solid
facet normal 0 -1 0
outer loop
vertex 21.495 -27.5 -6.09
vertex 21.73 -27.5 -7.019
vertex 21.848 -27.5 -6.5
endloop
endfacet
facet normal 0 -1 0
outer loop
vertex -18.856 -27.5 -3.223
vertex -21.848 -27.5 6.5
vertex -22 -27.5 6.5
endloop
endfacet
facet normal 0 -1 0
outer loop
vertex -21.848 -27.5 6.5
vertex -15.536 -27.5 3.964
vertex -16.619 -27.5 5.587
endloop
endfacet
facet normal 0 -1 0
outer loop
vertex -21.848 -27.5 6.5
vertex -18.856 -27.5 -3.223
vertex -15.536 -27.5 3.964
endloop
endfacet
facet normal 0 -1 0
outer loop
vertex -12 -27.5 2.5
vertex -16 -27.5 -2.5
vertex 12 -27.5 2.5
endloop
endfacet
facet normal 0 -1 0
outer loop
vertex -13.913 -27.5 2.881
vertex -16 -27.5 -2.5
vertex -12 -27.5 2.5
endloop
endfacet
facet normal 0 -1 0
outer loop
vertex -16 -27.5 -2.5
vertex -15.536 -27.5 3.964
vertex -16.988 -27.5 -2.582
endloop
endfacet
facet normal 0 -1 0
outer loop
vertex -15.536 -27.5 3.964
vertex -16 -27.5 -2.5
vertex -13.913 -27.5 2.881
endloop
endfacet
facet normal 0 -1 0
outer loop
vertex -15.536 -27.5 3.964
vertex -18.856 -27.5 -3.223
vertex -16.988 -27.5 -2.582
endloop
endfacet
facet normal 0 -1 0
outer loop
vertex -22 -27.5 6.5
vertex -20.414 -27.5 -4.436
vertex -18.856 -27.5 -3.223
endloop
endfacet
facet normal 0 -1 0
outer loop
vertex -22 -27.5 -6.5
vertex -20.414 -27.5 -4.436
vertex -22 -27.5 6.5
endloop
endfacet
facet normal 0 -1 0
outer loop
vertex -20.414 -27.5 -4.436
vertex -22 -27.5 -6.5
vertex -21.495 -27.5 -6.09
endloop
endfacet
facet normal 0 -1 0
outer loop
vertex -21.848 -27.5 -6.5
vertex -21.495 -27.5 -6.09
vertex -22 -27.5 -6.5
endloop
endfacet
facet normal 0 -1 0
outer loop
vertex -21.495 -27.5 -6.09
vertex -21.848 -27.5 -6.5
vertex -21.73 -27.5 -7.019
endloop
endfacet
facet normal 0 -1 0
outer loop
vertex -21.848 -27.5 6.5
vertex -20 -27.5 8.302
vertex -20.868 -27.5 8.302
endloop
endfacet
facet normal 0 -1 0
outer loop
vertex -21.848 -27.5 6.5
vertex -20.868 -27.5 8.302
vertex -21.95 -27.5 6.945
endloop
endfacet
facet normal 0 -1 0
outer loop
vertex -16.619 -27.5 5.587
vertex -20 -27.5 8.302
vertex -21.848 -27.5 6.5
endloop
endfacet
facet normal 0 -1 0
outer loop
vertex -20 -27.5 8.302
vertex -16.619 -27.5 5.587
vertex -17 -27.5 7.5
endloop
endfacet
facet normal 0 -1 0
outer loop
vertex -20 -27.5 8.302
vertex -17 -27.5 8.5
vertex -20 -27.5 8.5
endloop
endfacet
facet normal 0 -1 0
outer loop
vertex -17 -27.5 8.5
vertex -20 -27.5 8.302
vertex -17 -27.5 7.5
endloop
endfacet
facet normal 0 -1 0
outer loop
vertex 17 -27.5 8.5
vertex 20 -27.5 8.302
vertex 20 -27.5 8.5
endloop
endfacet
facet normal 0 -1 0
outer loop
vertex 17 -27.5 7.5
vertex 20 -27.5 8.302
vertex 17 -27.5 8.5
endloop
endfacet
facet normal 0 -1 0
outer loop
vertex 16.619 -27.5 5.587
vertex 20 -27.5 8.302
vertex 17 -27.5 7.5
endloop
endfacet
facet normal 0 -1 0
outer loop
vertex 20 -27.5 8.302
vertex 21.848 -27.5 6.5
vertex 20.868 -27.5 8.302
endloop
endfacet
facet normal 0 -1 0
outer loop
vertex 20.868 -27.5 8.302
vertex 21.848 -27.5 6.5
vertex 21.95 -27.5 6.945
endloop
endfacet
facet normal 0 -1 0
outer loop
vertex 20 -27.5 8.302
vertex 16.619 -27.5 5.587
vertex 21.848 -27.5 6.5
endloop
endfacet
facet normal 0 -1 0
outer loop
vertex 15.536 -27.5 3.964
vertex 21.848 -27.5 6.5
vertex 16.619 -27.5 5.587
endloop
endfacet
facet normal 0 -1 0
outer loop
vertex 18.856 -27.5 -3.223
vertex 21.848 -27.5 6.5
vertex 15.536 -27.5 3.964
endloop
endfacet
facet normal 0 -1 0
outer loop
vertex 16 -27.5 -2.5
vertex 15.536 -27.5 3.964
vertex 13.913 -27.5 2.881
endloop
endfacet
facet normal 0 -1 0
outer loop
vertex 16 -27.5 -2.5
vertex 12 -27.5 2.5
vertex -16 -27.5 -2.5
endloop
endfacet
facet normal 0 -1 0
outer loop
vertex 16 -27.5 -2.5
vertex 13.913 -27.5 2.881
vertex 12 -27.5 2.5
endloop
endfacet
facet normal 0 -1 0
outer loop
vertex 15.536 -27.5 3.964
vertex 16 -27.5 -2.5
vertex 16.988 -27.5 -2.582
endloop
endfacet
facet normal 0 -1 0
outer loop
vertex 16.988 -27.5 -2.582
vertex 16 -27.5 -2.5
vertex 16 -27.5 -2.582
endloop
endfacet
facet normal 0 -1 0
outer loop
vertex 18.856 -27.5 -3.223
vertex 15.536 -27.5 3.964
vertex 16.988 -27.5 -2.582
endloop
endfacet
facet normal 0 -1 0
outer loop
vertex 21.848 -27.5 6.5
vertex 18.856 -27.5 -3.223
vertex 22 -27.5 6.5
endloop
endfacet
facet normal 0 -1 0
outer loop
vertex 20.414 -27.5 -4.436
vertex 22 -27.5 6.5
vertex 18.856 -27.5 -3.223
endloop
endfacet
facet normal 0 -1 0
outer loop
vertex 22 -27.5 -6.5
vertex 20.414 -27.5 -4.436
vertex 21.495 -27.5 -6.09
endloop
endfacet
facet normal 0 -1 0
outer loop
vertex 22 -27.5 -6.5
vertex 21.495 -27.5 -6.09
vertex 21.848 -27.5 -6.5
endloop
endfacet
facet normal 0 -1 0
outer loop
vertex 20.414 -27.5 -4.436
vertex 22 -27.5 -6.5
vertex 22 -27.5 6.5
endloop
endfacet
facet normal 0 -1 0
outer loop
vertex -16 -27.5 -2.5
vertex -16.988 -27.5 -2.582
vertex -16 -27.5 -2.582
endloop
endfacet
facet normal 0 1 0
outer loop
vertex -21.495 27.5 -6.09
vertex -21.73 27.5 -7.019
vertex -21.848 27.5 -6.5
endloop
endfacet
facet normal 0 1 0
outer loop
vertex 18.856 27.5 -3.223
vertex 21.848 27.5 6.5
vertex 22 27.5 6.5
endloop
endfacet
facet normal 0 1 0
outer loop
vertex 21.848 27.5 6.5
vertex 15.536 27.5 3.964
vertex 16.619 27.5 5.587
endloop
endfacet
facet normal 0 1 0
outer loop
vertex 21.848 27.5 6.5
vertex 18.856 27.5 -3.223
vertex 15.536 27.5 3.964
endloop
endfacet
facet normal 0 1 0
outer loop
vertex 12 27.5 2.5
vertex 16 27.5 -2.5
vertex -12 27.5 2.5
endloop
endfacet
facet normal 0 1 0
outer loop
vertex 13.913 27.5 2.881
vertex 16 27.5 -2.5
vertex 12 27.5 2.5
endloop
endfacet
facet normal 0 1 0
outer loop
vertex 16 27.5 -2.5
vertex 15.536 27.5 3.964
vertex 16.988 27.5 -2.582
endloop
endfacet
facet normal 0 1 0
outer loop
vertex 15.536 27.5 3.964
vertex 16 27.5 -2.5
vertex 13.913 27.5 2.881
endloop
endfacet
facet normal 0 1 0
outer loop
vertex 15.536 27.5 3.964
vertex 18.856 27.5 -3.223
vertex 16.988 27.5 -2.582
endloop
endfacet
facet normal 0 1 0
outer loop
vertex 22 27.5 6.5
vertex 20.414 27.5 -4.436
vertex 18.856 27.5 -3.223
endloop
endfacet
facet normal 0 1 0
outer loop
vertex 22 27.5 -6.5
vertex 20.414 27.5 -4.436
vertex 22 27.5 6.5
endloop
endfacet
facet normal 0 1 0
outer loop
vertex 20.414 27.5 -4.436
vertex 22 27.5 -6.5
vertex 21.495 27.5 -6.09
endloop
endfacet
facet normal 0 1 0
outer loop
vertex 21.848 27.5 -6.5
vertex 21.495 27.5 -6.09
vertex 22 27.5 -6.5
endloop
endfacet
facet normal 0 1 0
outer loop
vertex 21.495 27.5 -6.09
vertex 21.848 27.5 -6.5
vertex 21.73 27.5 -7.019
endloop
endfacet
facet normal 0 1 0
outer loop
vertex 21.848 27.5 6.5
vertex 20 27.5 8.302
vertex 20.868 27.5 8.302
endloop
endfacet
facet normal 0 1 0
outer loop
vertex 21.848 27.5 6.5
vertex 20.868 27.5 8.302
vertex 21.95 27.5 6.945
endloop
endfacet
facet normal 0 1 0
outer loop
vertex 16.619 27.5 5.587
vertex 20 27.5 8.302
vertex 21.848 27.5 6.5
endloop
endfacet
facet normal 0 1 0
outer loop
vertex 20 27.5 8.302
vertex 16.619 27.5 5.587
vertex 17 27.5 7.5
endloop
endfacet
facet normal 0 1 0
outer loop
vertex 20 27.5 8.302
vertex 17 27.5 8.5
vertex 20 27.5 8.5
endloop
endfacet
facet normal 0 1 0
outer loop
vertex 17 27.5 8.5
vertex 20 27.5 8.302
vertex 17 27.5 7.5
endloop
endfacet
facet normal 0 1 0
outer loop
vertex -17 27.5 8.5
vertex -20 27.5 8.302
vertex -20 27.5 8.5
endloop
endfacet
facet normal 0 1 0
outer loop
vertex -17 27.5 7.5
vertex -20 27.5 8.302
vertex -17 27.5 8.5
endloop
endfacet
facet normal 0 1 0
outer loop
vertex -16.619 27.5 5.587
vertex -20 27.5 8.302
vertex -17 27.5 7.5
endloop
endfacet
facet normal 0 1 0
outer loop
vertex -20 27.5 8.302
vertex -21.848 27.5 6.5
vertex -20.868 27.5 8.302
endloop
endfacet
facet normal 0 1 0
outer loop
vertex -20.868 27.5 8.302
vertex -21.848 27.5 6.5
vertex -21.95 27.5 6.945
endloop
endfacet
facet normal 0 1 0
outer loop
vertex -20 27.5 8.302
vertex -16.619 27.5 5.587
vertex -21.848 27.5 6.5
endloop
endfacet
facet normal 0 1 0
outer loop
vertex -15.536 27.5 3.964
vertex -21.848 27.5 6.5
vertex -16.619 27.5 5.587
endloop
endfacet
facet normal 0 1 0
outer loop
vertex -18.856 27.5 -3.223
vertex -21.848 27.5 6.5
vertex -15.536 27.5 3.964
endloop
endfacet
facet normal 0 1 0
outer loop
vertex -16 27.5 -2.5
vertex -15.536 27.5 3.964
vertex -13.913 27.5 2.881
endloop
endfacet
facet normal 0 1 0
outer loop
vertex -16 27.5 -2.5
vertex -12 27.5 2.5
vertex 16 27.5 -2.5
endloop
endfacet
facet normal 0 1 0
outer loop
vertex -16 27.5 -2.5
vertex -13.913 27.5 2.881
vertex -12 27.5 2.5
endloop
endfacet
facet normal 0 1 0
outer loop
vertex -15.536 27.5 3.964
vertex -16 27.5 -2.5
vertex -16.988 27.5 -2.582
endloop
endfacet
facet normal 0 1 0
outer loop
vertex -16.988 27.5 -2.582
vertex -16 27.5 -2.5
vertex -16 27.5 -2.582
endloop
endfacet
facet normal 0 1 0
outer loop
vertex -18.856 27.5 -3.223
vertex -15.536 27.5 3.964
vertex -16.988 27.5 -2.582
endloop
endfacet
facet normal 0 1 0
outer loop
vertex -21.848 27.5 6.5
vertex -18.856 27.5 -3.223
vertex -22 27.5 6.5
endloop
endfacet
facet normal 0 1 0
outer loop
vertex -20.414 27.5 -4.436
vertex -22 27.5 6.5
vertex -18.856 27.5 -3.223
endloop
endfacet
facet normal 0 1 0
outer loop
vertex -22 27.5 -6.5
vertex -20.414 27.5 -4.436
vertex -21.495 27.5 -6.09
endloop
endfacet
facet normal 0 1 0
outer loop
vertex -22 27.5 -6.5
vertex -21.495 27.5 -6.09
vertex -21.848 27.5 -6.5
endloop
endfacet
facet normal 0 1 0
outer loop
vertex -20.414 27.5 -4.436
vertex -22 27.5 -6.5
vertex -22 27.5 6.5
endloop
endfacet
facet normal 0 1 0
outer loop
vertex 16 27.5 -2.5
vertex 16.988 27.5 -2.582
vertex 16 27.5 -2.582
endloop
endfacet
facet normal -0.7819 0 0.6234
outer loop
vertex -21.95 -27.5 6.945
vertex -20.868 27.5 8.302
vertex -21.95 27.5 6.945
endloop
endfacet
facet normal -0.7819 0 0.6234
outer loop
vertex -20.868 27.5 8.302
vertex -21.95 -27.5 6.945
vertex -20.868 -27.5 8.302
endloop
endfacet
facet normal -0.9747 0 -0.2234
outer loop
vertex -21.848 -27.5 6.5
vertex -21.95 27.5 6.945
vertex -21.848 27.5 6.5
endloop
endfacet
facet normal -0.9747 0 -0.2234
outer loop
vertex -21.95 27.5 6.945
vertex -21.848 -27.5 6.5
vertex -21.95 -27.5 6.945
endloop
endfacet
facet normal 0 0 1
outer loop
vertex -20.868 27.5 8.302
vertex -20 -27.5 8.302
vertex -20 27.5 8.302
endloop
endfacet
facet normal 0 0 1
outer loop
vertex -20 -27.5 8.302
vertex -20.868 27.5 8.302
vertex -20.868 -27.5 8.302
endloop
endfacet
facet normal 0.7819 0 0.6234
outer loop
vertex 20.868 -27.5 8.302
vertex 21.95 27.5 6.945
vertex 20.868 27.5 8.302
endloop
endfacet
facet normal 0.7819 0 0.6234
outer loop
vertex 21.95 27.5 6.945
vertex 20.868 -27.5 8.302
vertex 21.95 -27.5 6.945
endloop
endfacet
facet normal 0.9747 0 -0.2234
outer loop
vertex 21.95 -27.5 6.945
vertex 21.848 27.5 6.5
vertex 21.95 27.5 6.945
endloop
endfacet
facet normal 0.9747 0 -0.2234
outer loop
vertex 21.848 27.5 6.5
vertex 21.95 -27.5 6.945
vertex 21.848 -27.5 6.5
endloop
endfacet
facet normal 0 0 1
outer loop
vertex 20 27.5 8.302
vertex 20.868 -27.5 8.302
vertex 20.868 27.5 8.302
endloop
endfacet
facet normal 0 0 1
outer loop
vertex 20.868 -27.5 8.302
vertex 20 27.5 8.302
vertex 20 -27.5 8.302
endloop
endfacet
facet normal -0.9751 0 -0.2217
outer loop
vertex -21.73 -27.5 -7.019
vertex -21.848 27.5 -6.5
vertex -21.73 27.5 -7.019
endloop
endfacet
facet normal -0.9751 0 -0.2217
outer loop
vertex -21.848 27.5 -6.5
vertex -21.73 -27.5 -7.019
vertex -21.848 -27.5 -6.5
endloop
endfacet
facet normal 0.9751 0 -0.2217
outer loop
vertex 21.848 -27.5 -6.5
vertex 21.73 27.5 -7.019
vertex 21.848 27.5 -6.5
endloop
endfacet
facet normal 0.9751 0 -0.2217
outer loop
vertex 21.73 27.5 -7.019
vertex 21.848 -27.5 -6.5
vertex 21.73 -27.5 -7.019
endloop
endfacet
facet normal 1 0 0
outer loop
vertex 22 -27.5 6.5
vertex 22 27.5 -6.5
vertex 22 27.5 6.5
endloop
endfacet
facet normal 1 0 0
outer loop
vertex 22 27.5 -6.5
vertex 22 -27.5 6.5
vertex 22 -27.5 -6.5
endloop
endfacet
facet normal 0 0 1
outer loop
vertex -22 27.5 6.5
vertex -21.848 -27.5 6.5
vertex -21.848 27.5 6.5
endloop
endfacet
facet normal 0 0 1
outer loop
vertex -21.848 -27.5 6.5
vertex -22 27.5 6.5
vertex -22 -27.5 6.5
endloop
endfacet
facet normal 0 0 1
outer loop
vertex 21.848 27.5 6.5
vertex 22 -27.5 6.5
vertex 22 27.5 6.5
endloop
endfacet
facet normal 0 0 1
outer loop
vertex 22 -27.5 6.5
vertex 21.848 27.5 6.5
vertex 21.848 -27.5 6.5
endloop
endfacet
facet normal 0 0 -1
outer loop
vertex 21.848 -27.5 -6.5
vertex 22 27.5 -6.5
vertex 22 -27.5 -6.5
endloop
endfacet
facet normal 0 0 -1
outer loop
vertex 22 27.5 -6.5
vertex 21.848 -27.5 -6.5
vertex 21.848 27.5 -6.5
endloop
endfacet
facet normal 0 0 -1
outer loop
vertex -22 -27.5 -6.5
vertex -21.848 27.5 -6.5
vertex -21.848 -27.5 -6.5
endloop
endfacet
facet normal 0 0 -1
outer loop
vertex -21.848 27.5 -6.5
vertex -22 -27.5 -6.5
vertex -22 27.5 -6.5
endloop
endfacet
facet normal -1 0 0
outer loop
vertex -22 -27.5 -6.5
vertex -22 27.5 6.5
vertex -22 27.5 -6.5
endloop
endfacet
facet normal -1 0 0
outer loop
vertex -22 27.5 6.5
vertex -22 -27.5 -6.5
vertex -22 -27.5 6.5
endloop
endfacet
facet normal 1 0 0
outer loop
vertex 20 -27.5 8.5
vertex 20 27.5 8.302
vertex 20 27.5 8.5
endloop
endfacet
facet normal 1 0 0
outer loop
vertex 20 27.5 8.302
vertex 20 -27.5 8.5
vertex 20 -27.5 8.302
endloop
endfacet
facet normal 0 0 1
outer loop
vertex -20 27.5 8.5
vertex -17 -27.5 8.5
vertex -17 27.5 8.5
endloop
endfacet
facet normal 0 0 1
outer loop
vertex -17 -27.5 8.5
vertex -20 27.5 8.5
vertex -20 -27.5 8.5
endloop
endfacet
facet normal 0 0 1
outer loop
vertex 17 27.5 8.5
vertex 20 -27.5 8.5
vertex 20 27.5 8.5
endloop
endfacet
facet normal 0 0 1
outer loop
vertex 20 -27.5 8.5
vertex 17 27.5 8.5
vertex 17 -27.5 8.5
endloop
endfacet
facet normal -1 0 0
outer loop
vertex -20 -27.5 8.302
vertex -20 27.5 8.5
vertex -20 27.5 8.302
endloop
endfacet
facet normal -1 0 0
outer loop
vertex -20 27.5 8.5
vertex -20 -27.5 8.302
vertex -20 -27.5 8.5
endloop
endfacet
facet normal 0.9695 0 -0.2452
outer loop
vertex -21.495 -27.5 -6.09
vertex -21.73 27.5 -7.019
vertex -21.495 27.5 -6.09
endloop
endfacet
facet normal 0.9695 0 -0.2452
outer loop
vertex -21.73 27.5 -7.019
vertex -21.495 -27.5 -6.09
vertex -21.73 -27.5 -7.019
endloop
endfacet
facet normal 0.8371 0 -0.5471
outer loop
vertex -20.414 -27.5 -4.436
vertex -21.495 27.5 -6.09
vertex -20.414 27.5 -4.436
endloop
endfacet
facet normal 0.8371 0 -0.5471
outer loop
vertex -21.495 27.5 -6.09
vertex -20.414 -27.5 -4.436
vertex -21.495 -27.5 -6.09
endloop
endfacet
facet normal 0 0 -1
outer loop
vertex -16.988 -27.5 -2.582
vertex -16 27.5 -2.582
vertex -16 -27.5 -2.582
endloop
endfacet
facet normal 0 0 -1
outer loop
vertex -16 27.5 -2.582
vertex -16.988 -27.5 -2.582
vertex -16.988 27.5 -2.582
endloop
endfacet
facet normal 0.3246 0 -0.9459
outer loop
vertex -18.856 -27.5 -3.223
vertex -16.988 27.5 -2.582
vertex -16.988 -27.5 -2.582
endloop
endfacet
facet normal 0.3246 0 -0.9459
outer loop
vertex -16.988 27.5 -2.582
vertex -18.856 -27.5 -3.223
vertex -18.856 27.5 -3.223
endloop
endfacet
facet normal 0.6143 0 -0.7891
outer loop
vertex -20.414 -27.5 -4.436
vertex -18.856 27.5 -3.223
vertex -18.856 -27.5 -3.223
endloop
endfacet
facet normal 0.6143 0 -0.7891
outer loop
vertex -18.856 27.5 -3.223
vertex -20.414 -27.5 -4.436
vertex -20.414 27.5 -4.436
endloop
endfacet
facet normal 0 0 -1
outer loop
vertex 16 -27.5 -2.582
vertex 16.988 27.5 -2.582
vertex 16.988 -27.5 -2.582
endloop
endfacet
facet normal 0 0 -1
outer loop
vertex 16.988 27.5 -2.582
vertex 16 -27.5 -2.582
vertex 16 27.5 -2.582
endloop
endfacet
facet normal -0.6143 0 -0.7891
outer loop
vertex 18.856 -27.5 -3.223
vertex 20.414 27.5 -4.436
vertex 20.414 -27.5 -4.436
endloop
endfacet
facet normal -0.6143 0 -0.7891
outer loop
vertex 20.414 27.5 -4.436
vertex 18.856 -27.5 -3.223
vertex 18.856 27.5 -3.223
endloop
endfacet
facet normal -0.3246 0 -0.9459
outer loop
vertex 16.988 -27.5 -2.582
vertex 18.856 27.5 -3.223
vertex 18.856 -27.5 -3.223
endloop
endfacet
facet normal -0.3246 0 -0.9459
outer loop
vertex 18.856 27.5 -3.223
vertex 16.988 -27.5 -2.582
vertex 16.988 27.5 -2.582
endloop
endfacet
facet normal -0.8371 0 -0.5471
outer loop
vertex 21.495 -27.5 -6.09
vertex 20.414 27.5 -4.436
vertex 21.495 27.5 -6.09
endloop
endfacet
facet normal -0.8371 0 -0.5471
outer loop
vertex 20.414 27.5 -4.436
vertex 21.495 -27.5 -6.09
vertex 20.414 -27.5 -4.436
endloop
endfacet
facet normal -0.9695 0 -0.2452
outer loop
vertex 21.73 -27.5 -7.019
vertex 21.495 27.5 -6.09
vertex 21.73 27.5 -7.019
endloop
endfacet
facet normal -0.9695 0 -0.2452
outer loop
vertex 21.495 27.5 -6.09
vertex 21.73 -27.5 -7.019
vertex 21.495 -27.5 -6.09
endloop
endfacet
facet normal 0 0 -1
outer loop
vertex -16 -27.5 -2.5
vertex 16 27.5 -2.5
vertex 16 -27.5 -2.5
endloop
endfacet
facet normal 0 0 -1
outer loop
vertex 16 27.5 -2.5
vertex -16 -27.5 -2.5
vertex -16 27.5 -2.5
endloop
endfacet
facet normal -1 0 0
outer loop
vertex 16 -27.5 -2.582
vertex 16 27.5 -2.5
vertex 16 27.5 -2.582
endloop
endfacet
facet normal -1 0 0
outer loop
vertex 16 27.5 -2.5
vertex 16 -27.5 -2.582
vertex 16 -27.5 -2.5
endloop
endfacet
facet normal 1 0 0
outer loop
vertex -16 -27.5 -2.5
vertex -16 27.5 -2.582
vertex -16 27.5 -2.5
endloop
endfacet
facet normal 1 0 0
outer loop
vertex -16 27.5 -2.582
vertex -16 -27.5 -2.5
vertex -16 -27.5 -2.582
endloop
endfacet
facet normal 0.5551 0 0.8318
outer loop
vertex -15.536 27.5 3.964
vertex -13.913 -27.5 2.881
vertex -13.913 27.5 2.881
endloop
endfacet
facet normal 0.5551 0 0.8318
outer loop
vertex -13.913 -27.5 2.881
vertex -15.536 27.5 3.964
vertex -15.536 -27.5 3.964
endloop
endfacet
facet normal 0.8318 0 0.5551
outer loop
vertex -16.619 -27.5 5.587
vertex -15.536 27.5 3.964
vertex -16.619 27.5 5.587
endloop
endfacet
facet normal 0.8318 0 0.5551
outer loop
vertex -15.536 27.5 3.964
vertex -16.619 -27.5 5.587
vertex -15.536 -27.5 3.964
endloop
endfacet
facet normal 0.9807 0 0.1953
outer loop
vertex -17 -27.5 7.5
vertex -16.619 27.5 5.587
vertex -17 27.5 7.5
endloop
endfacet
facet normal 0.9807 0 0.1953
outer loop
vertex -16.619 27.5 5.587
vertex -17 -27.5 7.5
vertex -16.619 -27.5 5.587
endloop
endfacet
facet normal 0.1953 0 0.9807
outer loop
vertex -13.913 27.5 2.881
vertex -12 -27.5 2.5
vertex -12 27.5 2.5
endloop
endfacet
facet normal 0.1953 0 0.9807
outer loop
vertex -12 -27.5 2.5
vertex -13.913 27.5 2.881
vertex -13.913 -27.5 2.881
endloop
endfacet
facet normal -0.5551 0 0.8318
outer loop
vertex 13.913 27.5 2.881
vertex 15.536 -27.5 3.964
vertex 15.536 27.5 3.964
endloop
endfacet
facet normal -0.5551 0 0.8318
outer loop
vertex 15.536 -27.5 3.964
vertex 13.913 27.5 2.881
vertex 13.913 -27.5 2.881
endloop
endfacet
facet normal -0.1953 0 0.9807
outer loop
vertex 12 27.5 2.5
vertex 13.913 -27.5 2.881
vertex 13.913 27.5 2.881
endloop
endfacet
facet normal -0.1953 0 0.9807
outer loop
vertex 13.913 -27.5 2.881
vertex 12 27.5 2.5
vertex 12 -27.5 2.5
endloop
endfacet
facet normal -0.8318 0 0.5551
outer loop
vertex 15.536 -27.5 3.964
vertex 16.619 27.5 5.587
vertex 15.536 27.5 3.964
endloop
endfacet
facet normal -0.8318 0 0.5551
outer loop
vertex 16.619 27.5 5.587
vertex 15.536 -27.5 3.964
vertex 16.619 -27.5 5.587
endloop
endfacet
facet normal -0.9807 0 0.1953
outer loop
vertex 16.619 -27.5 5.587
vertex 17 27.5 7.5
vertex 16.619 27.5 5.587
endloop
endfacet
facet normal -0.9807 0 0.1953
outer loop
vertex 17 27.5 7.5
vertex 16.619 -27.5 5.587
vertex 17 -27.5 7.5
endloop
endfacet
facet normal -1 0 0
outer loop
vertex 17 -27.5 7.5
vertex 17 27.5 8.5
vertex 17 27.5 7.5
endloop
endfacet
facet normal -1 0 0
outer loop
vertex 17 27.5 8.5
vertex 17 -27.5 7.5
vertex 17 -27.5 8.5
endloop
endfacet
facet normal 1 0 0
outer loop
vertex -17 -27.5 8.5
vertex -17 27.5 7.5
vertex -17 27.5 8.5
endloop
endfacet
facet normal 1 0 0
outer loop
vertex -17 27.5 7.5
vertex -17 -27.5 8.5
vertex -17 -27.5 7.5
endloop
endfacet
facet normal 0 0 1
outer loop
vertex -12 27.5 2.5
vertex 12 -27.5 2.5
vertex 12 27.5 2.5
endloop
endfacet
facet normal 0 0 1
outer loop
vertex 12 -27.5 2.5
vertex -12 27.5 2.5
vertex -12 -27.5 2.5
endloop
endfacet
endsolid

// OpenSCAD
module powerbank (){
    rotate([90,90,0]) {
        translate([-5,-16,0]) {
            translate([0,0,0]) cylinder(h=97, r=6, center=true);
            translate([10,0,0]) cylinder(h=97, r=6, center=true);
            translate([0,32,0]) cylinder(h=97, r=6, center=true);
            translate([10,32,0]) cylinder(h=97, r=6, center=true);
            translate([5,16,0]) cube([10,44,97], center=true);
            translate([5,16,0]) cube([22,32,97], center=true);
        }
    }
}

module stem(){
    rotate([90,90,0]) {
        translate([-12,-12,0]) {
            translate([0,0,0]) cylinder(h=97, r=5, center=true);
            translate([24,0,0]) cylinder(h=97, r=5, center=true);
            translate([0,24,0]) cylinder(h=97, r=5, center=true);
            translate([24,24,0]) cylinder(h=97, r=5, center=true);
            translate([12,12,0]) cube([24,34,97], center=true);
            translate([12,12,0]) cube([34,24,97], center=true);
        }
    }
}

module spacer(){
    translate([-20,0,6.5]) rotate([90,90,0]) cylinder(h=55, r=2, center=true);
    translate([20,0,6.5]) rotate([90,90,0]) cylinder(h=55, r=2, center=true);
    translate([-20,0,-6.5]) rotate([90,90,0]) cylinder(h=55, r=2, center=true);
    translate([20,0,-6.5]) rotate([90,90,0]) cylinder(h=55, r=2, center=true);
    translate([0,0,0]) cube([44,55,13], center=true);
    translate([0,0,0]) cube([40,55,17], center=true);
}

difference() {
    spacer();
    translate([0,0,-13.5]) powerbank();
    translate([0,0, 19.5]) stem();
}
